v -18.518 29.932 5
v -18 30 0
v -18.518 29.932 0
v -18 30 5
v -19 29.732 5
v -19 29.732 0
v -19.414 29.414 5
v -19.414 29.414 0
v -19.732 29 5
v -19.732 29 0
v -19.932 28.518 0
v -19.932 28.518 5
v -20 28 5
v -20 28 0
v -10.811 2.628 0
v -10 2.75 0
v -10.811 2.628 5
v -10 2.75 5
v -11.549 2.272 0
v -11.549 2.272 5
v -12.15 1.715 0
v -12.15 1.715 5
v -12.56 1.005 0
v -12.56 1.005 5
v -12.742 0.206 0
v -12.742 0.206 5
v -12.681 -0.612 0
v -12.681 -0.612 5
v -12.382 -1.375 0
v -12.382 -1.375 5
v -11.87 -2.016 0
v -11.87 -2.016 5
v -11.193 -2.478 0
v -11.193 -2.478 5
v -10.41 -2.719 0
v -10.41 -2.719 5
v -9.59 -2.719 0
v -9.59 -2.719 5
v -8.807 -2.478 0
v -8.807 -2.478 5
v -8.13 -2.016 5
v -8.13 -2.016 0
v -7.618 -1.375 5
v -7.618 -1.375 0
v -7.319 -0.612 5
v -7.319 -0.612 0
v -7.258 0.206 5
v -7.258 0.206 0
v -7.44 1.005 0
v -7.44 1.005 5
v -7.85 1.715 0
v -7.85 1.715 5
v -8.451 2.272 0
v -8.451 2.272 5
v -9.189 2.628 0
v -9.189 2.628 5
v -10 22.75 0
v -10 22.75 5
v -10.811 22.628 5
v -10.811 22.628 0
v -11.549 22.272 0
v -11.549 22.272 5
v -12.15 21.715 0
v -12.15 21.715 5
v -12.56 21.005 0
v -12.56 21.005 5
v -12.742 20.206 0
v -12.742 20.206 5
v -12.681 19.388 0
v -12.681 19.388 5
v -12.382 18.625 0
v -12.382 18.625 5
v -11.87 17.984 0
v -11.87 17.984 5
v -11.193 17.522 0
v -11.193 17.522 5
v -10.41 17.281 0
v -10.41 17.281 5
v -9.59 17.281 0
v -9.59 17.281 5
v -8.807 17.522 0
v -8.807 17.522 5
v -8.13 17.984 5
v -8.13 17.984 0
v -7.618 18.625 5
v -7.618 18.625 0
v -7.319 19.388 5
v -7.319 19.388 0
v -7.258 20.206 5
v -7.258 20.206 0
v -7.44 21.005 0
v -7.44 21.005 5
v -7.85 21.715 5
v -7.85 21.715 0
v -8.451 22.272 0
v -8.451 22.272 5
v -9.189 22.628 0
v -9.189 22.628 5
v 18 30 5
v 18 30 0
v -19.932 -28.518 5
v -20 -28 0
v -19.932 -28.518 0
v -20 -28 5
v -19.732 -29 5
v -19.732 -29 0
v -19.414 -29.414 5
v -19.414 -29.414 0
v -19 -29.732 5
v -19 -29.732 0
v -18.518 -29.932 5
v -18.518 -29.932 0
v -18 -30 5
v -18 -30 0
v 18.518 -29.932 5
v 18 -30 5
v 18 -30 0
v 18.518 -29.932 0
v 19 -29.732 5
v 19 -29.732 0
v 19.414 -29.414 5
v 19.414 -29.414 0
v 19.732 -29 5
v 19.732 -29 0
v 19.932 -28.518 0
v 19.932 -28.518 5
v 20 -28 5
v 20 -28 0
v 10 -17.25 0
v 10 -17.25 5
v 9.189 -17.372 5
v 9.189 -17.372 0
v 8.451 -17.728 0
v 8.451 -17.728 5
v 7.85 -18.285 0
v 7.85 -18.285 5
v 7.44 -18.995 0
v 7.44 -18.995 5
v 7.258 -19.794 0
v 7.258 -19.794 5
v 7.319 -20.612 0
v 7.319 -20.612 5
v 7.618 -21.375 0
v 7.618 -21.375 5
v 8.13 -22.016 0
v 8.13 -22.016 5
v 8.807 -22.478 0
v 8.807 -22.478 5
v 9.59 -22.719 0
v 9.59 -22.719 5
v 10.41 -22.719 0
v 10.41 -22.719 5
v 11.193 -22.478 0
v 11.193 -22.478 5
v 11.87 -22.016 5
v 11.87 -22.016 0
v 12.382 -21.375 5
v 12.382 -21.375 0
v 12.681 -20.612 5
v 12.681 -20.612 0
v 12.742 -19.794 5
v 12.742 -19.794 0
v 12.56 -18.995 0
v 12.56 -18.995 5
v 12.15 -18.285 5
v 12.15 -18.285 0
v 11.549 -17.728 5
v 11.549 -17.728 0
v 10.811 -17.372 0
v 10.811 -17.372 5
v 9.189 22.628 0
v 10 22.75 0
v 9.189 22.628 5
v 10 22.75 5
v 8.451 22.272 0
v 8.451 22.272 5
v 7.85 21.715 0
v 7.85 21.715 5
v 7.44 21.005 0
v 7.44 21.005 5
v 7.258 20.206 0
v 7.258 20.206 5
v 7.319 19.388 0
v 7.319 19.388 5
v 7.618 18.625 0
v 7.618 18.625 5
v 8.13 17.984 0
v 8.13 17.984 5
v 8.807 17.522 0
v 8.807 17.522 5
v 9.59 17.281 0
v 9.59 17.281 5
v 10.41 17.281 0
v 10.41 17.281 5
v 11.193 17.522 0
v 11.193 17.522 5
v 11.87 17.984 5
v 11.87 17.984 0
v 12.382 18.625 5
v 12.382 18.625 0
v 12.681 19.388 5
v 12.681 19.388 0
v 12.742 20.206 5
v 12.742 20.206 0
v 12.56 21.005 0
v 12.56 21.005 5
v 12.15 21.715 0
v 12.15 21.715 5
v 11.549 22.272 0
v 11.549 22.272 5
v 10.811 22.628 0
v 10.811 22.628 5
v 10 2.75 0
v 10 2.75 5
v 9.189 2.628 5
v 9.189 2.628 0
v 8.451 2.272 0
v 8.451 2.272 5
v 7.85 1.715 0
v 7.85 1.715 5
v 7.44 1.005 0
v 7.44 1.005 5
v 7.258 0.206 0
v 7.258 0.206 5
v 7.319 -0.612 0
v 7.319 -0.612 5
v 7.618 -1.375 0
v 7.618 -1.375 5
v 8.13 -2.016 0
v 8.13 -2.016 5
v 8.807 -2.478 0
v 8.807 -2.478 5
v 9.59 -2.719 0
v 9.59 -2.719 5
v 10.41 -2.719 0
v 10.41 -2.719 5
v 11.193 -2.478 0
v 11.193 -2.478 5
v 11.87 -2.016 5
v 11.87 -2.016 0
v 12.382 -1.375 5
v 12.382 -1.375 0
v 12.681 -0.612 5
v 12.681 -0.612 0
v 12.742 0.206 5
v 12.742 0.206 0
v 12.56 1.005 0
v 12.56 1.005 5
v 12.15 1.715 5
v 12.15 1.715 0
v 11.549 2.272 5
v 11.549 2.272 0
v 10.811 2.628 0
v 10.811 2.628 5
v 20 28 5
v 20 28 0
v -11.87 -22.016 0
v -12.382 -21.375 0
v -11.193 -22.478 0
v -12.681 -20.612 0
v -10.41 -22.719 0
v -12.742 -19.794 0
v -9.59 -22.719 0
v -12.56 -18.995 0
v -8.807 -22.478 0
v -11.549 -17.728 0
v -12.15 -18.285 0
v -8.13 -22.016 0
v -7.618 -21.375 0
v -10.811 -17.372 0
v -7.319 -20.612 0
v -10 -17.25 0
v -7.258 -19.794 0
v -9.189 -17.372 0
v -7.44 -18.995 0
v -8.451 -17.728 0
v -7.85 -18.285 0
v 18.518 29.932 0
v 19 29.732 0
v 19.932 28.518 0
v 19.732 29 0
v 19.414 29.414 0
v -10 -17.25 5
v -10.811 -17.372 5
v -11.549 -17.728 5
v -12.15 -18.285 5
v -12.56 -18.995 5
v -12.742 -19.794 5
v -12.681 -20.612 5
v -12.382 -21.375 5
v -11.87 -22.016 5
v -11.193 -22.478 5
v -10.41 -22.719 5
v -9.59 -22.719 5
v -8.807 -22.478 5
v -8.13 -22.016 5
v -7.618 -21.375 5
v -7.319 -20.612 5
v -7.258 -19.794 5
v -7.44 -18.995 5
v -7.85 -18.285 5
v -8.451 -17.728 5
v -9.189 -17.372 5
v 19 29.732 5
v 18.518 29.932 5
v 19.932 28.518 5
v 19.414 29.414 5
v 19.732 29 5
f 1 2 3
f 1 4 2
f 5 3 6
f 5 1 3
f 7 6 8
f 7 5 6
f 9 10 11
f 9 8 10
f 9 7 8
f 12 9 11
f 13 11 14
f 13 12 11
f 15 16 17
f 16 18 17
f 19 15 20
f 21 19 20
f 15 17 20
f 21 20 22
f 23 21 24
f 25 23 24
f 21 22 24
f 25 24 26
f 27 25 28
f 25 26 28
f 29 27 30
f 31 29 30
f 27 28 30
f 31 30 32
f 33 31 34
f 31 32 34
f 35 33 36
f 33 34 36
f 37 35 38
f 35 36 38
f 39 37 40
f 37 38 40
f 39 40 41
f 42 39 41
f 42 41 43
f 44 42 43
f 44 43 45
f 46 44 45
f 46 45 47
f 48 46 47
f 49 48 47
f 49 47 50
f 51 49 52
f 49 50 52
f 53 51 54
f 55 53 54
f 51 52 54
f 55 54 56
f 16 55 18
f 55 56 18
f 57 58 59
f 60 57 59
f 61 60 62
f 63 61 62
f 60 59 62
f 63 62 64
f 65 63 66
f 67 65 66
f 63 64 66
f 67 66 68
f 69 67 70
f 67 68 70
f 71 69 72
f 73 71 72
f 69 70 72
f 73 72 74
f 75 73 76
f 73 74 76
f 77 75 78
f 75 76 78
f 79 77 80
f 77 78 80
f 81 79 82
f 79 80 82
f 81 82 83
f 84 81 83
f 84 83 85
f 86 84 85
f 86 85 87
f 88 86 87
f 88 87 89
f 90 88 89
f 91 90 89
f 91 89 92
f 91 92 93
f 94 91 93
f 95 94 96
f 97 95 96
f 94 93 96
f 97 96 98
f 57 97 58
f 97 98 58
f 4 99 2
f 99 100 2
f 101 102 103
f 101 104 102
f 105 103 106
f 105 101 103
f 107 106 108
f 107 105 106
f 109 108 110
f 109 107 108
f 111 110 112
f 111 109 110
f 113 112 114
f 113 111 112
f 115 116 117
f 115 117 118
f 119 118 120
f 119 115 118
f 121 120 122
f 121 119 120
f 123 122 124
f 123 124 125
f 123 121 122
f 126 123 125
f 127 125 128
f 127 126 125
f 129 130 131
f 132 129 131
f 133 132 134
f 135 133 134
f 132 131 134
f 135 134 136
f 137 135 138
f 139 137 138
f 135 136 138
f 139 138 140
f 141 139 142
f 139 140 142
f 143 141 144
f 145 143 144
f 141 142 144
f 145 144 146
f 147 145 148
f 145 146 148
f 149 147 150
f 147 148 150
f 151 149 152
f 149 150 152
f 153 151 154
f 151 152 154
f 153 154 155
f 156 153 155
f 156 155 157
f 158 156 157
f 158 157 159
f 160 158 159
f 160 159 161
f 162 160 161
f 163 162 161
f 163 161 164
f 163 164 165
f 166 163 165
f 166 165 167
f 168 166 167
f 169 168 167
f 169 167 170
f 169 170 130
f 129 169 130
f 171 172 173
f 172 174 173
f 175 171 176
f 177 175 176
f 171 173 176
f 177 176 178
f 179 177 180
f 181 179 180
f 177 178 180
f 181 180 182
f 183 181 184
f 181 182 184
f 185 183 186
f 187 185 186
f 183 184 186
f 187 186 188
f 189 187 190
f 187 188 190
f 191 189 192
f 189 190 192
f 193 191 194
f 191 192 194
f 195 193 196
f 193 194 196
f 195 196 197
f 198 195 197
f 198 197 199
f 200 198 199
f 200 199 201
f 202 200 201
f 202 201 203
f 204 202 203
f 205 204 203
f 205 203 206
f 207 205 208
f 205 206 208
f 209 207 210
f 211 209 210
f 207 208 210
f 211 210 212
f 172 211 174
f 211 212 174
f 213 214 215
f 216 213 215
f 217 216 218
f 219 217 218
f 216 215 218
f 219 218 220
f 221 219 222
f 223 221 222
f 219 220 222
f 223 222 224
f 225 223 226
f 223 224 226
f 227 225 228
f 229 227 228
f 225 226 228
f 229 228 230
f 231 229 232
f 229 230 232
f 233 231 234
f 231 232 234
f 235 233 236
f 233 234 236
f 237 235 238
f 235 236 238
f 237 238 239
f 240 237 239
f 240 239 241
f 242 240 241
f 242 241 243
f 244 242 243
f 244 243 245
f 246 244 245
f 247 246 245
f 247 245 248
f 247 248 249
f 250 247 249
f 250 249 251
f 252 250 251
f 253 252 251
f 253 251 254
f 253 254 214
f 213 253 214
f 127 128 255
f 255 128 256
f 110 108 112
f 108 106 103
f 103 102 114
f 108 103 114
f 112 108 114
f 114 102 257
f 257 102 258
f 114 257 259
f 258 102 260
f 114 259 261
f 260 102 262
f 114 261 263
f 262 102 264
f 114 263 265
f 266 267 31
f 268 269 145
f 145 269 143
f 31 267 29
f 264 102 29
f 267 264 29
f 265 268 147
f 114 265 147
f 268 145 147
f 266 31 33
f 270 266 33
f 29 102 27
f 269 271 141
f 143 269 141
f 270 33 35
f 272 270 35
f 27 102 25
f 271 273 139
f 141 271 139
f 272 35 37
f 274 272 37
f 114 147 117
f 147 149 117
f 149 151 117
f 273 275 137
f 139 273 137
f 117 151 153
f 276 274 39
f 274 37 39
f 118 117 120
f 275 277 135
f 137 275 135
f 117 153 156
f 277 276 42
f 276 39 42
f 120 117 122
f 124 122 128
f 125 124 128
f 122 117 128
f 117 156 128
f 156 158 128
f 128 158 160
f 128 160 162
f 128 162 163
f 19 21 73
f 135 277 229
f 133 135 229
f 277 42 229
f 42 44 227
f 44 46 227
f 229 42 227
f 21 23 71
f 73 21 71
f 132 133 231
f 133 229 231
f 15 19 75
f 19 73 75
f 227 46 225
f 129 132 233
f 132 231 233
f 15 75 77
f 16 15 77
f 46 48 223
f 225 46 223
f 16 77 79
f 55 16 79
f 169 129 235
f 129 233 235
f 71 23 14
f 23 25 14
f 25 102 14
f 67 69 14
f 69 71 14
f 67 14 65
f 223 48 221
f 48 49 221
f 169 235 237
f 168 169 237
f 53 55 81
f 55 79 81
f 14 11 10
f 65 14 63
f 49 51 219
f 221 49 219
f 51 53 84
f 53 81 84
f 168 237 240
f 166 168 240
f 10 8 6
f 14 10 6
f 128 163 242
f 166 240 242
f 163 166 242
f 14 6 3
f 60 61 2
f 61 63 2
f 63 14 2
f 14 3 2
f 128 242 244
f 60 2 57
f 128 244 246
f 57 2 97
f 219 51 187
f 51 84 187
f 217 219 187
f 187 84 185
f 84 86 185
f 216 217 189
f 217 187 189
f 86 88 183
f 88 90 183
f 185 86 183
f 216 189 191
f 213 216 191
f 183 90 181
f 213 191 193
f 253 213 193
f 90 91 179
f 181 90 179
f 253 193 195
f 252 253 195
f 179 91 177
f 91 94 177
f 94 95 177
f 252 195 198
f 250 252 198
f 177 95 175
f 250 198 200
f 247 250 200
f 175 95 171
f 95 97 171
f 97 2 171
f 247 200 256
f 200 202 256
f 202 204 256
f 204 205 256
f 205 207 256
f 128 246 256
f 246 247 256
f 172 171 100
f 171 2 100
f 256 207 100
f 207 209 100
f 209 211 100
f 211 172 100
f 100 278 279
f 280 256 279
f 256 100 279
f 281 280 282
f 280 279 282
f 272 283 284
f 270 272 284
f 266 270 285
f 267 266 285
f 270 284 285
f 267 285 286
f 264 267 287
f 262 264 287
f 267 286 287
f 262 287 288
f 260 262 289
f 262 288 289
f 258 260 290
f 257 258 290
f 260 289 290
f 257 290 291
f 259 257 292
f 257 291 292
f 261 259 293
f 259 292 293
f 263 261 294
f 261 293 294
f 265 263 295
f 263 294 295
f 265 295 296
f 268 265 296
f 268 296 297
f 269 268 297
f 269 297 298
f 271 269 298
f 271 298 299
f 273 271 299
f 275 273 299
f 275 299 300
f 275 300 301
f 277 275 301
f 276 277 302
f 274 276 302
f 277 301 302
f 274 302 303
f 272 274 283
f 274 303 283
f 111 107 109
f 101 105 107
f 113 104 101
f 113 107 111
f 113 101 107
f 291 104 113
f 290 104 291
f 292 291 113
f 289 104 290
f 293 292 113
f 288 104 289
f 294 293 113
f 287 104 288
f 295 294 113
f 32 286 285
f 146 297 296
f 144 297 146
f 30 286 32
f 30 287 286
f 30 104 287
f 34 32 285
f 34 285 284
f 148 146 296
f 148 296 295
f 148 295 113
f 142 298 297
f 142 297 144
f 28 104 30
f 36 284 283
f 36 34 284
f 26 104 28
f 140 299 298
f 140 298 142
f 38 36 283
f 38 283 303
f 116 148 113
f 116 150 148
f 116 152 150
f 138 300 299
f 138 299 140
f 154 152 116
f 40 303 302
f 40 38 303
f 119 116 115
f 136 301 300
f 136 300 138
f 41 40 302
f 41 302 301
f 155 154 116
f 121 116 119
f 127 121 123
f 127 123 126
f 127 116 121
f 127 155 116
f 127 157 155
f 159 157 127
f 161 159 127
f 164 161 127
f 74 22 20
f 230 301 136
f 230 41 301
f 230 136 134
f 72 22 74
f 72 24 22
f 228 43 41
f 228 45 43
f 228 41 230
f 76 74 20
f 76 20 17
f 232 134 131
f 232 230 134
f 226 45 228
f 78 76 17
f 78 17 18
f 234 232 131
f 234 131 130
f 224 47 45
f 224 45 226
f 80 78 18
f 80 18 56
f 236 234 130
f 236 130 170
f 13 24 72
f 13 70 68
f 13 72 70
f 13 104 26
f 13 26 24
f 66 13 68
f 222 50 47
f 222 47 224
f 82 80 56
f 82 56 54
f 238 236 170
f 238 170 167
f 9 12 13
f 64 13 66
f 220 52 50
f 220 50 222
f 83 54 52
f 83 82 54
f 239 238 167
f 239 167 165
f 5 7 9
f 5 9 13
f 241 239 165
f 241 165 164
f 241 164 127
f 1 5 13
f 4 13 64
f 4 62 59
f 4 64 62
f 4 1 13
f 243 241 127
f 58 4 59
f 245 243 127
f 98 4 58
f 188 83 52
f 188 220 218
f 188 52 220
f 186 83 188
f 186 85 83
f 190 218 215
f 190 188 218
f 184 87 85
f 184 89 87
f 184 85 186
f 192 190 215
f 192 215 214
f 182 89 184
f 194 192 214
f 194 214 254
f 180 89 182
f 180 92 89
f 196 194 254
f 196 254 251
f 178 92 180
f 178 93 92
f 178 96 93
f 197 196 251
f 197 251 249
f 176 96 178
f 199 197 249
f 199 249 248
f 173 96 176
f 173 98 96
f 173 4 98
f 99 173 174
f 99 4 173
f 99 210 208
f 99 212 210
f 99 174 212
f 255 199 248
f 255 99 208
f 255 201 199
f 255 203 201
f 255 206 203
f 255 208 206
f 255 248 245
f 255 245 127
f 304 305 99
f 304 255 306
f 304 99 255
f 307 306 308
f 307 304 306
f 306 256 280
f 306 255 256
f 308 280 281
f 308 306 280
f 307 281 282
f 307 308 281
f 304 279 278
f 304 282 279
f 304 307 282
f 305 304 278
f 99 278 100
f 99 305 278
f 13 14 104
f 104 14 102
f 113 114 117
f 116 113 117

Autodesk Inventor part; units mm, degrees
ref_plane "YZ Plane" through (0, 0, 0) normal (1, 0, 0) x (0, 1, 0)
ref_plane "XZ Plane" through (0, 0, 0) normal (0, 1, 0) x (-1, 0, 0)
ref_plane "XY Plane" through (0, 0, 0) normal (0, 0, 1) x (1, 0, 0)
sketch "Sketch2" plane through (0, 0, 0) normal (0, 0, 1) x (1, 0, 0)
  line L0 (-20, -30) -> (20, -30)
  line L1 (20, -30) -> (20, 30)
  line L2 (20, 30) -> (-20, 30)
  line L3 (-20, 30) -> (-20, -30)
  line L4 (-20, -30) -> (20, 30) construction
  line L5 (20, -30) -> (-20, 30) construction
  line L6 (-10, 20) -> (10, 20) construction
  line L7 (10, 20) -> (10, 0) construction
  line L8 (10, 0) -> (10, -20) construction
  line L9 (10, -20) -> (-10, -20) construction
  line L10 (-10, -20) -> (-10, 0) construction
  line L11 (-10, 0) -> (10, 0) construction
  line L12 (-10, 20) -> (-10, 0) construction
  point P0 (0, 0)
  dimension "d0" = 40
  dimension "d1" = 60
  dimension "d2" = 20
  dimension "d3" = 20
extrude "Extrusion1" add sketch "Sketch2" along normal blind 5
hole "Hole1" at (-10, 20, 0) at (-10, 0, 0) at (-10, -20, 0) at (10, -20, 0) at (10, 0, 0) at (10, 20, 0) direction (0, 0, 1) diameter 5.5 end through all clearance for "Flat Head Machine Screw" size "M5" standard "Ansi Metric M Profile"
fillet "Fillet1" radius 2 4 edges at (-20, 30, 2.5) (20, 30, 2.5) (-20, -30, 2.5) (20, -30, 2.5)
properties part number "4060Rect"
